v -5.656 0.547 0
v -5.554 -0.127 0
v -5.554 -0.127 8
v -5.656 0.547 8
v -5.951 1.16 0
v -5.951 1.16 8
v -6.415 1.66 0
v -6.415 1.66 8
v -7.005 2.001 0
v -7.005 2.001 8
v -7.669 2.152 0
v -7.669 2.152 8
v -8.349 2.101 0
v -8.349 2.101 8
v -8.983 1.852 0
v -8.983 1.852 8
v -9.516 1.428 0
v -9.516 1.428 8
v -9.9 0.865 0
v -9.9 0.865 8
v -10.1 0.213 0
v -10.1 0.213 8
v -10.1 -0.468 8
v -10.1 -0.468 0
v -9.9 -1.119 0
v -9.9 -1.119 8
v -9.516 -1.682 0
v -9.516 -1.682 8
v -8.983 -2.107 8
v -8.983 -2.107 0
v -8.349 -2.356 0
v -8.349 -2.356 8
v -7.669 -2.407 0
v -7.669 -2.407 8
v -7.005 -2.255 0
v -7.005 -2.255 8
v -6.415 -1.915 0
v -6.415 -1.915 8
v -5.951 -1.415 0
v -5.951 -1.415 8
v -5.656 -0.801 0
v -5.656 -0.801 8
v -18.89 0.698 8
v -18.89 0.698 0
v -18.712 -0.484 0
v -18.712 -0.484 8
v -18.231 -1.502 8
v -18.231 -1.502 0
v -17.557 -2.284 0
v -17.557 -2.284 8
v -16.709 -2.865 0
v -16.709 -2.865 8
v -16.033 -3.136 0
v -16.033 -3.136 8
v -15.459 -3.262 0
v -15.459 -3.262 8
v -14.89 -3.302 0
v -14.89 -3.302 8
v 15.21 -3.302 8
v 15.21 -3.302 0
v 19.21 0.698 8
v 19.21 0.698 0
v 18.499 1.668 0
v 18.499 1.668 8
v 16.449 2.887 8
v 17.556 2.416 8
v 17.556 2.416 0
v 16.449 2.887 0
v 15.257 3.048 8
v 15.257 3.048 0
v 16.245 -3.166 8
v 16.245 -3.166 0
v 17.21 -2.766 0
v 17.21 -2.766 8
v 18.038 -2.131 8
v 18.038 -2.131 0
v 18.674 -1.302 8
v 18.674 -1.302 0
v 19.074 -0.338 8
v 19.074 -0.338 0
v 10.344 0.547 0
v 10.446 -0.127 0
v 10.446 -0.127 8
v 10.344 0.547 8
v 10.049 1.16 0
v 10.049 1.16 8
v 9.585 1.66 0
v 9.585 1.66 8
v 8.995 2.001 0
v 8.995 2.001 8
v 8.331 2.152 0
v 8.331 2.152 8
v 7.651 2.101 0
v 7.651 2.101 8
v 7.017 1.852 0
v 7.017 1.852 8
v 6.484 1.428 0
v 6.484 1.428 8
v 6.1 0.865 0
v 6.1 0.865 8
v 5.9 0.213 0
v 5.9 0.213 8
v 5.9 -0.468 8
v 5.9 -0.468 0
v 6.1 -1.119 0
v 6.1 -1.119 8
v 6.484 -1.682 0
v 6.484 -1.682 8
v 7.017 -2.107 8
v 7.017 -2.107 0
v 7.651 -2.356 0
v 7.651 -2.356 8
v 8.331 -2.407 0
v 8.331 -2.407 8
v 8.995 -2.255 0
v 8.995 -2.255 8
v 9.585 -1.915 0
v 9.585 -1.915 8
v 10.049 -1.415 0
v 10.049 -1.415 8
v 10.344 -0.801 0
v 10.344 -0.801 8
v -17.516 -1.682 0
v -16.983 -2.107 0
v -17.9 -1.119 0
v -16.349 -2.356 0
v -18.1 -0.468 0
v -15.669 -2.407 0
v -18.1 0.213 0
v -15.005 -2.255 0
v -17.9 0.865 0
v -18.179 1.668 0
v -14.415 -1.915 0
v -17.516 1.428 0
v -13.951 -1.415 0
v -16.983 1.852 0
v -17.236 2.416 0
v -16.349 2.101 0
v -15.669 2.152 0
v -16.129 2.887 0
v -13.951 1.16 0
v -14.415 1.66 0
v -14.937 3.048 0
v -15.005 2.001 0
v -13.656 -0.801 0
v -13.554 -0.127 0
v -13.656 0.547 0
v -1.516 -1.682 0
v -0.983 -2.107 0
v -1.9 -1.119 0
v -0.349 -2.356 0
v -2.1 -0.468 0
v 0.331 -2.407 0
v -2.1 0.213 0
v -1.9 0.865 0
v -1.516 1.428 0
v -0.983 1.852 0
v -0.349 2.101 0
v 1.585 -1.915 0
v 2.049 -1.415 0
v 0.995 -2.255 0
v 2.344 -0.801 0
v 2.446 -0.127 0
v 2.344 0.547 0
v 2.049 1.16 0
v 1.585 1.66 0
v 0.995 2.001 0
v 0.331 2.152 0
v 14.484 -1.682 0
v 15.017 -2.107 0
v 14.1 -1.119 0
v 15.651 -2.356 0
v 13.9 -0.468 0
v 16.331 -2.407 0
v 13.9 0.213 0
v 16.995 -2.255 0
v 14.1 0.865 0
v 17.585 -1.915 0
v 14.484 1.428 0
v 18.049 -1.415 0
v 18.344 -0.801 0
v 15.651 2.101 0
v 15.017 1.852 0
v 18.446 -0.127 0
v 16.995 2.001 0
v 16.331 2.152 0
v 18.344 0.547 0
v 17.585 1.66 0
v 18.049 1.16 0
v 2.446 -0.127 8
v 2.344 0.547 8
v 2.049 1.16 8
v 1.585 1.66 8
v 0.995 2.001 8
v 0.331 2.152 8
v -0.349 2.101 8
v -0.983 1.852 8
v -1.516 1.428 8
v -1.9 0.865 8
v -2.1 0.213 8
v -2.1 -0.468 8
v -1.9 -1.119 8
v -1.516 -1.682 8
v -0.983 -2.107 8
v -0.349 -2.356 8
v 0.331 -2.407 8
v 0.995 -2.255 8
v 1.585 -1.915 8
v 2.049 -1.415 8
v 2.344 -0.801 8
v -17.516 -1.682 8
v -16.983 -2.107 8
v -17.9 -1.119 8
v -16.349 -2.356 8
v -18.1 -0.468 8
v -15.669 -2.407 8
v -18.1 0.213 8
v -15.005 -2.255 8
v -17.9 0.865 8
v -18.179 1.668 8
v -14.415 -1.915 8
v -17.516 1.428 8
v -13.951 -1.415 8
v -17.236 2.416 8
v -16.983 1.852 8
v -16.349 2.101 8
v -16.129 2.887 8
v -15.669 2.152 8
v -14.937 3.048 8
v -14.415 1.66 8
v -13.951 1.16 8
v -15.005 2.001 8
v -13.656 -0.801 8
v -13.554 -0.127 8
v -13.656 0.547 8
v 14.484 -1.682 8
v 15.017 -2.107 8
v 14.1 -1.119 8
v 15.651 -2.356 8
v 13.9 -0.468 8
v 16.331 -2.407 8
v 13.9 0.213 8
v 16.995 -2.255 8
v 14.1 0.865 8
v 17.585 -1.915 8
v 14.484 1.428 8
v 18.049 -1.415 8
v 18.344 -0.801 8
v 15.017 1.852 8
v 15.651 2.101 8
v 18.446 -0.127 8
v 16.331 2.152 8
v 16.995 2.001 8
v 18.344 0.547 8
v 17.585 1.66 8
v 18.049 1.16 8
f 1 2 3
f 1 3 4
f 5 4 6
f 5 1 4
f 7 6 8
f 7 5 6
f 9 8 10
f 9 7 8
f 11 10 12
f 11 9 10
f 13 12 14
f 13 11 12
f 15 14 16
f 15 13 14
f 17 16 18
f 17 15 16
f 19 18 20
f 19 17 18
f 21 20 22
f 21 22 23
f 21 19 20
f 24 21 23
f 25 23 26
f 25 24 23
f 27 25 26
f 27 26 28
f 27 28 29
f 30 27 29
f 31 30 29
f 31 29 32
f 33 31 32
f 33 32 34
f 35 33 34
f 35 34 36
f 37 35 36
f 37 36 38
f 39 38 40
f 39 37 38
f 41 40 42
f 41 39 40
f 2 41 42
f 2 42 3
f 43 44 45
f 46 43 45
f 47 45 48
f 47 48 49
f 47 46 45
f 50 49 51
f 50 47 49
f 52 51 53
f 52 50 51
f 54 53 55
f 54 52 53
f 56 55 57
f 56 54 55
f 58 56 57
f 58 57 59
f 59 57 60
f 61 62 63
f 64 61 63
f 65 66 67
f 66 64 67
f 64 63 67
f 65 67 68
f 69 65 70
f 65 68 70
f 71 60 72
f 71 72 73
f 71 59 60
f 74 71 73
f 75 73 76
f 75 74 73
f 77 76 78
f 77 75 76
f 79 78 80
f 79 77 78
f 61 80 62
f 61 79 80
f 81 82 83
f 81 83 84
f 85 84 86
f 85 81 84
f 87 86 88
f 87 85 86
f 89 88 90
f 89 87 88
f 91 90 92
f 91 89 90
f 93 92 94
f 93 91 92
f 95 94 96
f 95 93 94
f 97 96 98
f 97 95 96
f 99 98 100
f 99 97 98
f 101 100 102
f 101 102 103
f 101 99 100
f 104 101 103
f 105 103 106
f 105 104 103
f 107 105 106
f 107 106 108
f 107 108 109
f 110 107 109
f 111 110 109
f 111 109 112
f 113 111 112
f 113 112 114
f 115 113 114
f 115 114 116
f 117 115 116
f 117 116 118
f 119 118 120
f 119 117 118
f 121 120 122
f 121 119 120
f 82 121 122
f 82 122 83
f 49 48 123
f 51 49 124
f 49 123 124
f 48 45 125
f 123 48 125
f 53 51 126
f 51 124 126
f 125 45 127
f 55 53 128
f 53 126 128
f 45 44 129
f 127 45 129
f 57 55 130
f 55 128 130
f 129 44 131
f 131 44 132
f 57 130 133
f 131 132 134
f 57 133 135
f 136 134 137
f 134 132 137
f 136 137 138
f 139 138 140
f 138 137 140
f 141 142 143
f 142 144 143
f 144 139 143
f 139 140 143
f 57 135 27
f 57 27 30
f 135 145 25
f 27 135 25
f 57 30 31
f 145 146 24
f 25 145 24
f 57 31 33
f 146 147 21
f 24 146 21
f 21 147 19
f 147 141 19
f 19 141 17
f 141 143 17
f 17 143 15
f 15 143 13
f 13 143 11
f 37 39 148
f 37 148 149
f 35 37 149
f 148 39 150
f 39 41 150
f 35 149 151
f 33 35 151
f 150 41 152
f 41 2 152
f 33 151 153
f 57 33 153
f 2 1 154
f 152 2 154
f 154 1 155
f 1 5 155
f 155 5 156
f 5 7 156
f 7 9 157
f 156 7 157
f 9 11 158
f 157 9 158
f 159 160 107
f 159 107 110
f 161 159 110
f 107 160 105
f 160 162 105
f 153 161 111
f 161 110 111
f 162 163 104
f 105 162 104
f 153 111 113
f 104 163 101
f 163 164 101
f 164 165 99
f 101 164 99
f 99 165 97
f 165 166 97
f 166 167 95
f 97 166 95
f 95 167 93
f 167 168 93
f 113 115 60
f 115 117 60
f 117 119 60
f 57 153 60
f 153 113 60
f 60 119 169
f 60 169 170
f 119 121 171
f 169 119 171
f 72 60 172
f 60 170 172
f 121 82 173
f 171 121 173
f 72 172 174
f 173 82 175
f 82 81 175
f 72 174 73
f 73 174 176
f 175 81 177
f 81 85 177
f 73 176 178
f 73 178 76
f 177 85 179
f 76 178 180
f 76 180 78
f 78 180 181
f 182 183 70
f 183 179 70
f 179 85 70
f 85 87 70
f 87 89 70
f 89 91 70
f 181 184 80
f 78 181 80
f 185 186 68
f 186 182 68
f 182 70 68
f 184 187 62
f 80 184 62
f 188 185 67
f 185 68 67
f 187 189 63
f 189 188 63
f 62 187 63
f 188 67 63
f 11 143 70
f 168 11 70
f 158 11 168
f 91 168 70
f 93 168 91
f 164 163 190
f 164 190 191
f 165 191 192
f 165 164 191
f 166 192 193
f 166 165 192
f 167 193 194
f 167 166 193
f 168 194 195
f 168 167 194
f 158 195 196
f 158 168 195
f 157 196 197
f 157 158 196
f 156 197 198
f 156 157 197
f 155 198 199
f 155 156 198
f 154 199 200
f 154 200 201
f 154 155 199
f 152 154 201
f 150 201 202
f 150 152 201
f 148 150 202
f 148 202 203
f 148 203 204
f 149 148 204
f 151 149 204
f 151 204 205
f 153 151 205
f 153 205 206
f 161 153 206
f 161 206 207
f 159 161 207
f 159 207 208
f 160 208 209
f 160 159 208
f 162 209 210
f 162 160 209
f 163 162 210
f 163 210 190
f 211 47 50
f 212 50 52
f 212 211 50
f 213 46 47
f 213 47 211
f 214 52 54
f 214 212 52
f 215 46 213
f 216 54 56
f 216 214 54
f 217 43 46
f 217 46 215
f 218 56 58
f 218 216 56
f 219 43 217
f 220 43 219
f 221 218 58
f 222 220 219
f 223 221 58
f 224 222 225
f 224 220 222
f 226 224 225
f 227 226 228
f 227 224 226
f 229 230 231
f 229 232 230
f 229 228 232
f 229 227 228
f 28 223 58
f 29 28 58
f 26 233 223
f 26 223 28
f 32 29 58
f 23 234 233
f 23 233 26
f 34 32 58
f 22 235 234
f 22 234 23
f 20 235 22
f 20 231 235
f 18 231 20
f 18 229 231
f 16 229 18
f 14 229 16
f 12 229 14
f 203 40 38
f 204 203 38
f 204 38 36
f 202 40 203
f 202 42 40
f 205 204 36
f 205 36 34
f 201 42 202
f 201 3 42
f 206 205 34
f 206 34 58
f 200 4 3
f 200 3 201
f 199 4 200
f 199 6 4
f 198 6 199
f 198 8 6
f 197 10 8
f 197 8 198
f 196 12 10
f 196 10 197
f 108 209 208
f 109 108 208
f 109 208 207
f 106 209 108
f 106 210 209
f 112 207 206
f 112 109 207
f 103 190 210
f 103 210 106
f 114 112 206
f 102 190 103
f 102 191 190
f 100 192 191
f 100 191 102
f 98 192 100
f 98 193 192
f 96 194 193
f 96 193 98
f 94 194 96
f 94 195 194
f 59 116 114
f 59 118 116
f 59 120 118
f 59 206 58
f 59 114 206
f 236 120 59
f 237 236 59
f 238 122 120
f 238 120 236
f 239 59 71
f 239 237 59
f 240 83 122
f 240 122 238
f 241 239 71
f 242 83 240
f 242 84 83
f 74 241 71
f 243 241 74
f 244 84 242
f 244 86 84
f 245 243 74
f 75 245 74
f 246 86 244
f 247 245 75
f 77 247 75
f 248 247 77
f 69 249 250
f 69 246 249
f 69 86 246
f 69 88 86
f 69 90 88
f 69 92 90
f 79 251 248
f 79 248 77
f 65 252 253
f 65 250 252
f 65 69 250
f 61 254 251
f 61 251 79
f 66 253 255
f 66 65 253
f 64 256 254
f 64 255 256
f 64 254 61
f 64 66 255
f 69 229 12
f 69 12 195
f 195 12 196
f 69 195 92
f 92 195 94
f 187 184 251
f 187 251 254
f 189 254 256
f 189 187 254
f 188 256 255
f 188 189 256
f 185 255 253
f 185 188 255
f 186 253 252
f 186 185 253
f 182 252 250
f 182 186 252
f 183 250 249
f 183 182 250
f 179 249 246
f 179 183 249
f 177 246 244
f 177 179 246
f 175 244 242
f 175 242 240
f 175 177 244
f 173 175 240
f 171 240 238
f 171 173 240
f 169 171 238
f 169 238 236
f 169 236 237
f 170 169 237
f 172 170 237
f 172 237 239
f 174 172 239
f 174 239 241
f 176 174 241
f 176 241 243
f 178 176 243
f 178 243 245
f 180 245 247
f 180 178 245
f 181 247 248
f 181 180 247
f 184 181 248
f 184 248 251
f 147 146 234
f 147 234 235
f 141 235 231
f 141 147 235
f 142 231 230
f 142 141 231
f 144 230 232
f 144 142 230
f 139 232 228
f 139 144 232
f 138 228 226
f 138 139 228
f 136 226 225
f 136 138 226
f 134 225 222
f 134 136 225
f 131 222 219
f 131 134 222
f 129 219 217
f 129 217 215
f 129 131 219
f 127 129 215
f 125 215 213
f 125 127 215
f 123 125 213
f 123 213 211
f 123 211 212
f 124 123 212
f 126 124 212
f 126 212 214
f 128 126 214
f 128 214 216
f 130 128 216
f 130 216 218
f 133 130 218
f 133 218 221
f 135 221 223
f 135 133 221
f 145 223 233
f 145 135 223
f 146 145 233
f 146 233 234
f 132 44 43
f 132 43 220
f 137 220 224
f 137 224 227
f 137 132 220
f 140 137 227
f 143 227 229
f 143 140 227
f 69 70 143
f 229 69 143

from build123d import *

# Parameters (mm, degrees)
F0_R        = 2.286
F1_DEPTH    = 8
F2_R        = 4
F3_R        = 4
F4_T1_DEPTH = 27.7658164516
F5_T1_DEPTH = 27.7658164516


# Not quite as in the source:
# - a fillet or chamfer that OpenCascade refuses, or shapes differently, is made with other operations: its cross-section is extruded or revolved along the edge and cut away or added


with BuildPart() as f1:
    # F0 (on Top) → F1 (new body)
    with BuildSketch(Plane.XY):
        Polygon((19.2099873261, 3.0477390712), (-18.8900126739, 3.0477390712), (-18.8900126739, -3.3271788533), (-17.4405010572, -3.3022609288), (19.2099873261, -3.3022609288), align=None)
        with Locations((-15.8400126739, -0.1272609288)):
            Circle(F0_R, mode=Mode.SUBTRACT)
        with Locations((-7.8400126739, -0.1272609288)):
            Circle(F0_R, mode=Mode.SUBTRACT)
        with Locations((0.1599873261, -0.1272609288)):
            Circle(F0_R, mode=Mode.SUBTRACT)
        with Locations((8.1599873261, -0.1272609288)):
            Circle(F0_R, mode=Mode.SUBTRACT)
        with Locations((16.1599873261, -0.1272609288)):
            Circle(F0_R, mode=Mode.SUBTRACT)
    extrude(amount=F1_DEPTH)

    # F2
    f2_edges = [f1.edges().sort_by_distance(p)[0] for p in [
        (-18.890013, -3.327179, 4),
    ]]
    fillet(f2_edges, radius=F2_R)

    # F3
    f3_edges = [f1.edges().sort_by_distance(p)[0] for p in [
        (19.209987, -3.302261, 4),
    ]]
    fillet(f3_edges, radius=F3_R)

    # F4: fillet of radius 4.5 on 1 edges, made by hand

    # F4_s2 → F4_t1 (cut)
    with BuildSketch(Plane.XY.offset(-9.8829082258)):
        with BuildLine():
            ThreePointArc((19.2099873261, 0.6977390712), (17.5562804933, 2.4158781586), (15.2568240358, 3.0477390712))
            Line((15.2568240358, 3.0477390712), (19.2099873261, 3.0477390712))
            Line((19.2099873261, 3.0477390712), (19.2099873261, 0.6977390712))
        make_face()
    extrude(amount=F4_T1_DEPTH, mode=Mode.SUBTRACT)

    # F5: fillet of radius 4.5 on 1 edges, made by hand

    # F5_s2 → F5_t1 (cut)
    with BuildSketch(Plane.XY.offset(-9.8829082258)):
        with BuildLine():
            ThreePointArc((-18.8900126739, 0.6977390712), (-17.2363058411, 2.4158781586), (-14.9368493836, 3.0477390712))
            Line((-14.9368493836, 3.0477390712), (-18.8900126739, 3.0477390712))
            Line((-18.8900126739, 3.0477390712), (-18.8900126739, 0.6977390712))
        make_face()
    extrude(amount=F5_T1_DEPTH, mode=Mode.SUBTRACT)


solid = f1.part
